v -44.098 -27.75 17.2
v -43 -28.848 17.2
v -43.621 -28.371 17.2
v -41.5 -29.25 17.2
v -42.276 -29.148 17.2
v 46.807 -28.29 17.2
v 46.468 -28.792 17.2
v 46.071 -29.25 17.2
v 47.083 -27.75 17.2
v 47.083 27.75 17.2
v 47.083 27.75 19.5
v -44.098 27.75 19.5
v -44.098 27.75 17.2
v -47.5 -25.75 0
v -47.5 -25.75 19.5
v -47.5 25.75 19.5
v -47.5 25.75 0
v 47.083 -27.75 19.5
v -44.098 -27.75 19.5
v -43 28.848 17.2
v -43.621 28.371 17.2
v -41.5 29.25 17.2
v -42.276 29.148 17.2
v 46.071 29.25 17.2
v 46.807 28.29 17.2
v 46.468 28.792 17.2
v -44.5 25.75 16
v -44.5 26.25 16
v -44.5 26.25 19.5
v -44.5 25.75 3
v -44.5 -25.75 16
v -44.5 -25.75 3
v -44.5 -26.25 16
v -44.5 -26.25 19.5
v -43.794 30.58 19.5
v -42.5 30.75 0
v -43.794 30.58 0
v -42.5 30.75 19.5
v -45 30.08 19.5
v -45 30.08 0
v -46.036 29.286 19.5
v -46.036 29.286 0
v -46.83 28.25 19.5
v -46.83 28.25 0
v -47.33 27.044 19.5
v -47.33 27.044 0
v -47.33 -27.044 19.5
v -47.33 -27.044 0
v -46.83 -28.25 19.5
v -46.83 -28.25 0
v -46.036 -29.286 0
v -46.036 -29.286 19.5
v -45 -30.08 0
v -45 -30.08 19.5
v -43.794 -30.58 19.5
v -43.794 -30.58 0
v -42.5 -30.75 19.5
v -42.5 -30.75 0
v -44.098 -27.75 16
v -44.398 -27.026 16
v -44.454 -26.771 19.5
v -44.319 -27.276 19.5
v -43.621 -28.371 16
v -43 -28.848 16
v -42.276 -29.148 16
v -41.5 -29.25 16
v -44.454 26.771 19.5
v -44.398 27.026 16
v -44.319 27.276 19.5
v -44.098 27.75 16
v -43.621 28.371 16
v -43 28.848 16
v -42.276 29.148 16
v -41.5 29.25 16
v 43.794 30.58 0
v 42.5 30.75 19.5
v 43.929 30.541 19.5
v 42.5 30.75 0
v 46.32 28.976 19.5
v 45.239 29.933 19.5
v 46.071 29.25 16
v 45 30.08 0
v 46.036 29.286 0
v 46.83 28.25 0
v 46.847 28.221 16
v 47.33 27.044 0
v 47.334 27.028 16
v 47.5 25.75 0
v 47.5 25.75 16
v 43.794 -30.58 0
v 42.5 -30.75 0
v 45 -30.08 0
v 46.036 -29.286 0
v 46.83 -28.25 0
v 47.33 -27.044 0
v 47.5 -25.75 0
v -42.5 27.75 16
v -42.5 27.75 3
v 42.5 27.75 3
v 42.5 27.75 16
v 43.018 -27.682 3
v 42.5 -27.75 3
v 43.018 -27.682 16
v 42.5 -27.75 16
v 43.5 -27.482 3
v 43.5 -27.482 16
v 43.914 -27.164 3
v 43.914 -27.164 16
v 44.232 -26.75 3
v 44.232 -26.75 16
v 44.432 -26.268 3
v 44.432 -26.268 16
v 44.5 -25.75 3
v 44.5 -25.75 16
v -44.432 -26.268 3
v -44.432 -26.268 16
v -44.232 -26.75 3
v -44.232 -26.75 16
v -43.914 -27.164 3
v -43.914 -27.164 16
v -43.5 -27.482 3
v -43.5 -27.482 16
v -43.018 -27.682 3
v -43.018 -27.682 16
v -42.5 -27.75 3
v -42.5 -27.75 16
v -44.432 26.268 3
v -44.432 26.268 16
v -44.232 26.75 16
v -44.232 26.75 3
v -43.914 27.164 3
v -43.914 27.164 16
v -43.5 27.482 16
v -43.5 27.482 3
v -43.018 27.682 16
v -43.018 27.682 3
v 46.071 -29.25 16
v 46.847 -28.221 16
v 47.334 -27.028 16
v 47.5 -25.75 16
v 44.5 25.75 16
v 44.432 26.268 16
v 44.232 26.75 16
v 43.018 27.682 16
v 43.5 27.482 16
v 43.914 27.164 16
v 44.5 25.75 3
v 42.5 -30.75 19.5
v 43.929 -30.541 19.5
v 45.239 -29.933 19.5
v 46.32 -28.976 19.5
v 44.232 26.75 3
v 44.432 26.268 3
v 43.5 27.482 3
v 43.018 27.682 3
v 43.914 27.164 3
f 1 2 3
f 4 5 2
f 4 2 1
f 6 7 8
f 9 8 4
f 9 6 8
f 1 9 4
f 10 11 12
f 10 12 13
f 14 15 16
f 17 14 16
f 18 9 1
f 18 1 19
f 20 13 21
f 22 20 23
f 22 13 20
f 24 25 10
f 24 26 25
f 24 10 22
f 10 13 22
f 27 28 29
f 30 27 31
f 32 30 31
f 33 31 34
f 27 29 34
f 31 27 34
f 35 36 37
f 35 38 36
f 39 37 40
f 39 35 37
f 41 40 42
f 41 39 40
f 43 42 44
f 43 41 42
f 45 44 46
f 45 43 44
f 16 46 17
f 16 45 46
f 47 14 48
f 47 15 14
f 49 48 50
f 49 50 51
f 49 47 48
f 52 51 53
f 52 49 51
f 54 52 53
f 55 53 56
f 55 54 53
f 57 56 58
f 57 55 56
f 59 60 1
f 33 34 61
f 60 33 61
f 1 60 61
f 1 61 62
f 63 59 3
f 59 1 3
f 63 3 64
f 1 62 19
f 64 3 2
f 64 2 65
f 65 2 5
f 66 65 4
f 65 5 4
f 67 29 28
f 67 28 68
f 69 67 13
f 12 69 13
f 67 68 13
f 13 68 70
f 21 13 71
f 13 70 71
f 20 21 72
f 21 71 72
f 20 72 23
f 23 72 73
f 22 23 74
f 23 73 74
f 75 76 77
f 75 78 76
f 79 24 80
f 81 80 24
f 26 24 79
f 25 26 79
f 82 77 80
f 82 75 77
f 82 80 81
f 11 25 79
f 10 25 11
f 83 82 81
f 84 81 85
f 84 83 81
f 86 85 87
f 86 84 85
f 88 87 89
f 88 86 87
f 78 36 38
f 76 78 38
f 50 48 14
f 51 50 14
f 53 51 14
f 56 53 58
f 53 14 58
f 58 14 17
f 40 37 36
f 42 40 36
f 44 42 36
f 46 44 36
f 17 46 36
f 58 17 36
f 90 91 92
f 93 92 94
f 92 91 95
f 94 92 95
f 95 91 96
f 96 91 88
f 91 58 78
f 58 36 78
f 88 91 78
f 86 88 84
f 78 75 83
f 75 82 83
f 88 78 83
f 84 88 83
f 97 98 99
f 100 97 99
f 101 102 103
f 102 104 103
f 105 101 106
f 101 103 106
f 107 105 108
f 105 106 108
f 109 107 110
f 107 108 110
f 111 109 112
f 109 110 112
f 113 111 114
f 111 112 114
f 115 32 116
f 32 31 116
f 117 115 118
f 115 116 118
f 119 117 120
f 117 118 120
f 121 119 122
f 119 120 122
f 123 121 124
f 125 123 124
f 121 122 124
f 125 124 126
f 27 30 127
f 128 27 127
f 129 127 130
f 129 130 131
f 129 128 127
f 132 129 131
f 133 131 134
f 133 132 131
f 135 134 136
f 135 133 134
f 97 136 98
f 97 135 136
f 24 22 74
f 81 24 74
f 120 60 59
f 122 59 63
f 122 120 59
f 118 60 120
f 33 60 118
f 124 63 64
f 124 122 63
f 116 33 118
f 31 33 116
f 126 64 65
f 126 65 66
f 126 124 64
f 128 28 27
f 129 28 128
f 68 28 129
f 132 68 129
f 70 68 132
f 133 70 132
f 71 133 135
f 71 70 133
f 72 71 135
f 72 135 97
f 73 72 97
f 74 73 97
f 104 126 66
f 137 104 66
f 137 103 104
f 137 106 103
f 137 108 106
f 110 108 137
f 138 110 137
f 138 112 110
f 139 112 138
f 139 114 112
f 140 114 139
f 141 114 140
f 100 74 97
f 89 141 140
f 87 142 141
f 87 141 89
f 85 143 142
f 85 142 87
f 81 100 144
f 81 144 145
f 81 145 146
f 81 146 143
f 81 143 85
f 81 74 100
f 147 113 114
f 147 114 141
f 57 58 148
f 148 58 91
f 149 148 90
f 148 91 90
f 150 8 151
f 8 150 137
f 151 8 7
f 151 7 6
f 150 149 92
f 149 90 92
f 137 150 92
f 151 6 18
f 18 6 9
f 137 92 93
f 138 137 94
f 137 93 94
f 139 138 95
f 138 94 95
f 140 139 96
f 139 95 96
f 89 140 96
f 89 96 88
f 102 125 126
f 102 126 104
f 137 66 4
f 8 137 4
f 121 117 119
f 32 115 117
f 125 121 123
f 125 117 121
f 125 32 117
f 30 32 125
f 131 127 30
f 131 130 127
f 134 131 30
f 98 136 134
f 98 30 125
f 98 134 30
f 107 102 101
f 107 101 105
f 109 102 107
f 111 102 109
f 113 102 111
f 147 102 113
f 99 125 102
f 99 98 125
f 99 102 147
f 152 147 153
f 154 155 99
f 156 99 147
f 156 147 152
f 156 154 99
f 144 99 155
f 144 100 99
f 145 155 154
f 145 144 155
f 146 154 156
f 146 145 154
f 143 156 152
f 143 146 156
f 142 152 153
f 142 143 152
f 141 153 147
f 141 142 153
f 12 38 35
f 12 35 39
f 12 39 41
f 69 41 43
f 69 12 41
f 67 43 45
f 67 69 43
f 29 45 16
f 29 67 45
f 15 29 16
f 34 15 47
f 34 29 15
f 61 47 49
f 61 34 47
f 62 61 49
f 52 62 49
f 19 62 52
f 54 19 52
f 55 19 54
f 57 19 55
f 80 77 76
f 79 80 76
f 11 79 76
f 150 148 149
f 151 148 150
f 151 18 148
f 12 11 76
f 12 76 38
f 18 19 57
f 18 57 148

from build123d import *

# Parameters (mm, degrees)
F0_W     = 89
F0_H     = 55.5
F1_DEPTH = 3
F0_W_2   = 95
F0_H_2   = 61.5
F2_DEPTH = 16
F4_DEPTH = 95
F5_W     = 61.5
F5_H     = 3.5
F6_DEPTH = 3
F7_R     = 5
F8_R     = 2
F9_R     = 3


with BuildPart() as f1:
    # F0 (on Top) → F1 (new body)
    with BuildSketch(Plane.XY):
        Rectangle(F0_W, F0_H)
    extrude(amount=F1_DEPTH)

    # F0 (on Top) → F2 (join)
    with BuildSketch(Plane.XY):
        Rectangle(F0_W_2, F0_H_2)
        Rectangle(F0_W, F0_H, mode=Mode.SUBTRACT)
    extrude(amount=F2_DEPTH)

    # F3 (on face) → F4 (join, through all)
    with BuildSketch(Plane.YZ.offset(47.5)):
        Polygon((29.25, 16), (30.75, 16), (30.75, 19.5), (27.75, 19.5), (27.75, 17.2), (29.25, 17.2), align=None)
        Polygon((-29.25, 17.2), (-27.75, 17.2), (-27.75, 19.5), (-30.75, 19.5), (-30.75, 16), (-29.25, 16), align=None)
    extrude(amount=-F4_DEPTH)

    # F5 (on face) → F6 (join)
    with BuildSketch(Plane(origin=(-47.5, 0, 0), x_dir=(0, -1, 0), z_dir=(-1, 0, 0))):
        with Locations((0, 17.75)):
            Rectangle(F5_W, F5_H)
    extrude(amount=-F6_DEPTH)

    # F7
    f7_edges = [f1.edges().sort_by_distance(p)[0] for p in [
        (47.5, -30.75, 9.75),
        (-47.5, -30.75, 9.75),
        (47.5, 30.75, 9.75),
        (-47.5, 30.75, 9.75),
    ]]
    fillet(f7_edges, radius=F7_R)

    # F8
    f8_edges = [f1.edges().sort_by_distance(p)[0] for p in [
        (-44.5, 27.75, 9.5),
        (-44.5, -27.75, 9.5),
        (44.5, -27.75, 9.5),
        (44.5, 27.75, 9.5),
    ]]
    fillet(f8_edges, radius=F8_R)

    # F9
    f9_edges = [f1.edges().sort_by_distance(p)[0] for p in [
        (-44.5, -29.25, 16.6),
        (-44.5, 29.25, 16.6),
    ]]
    fillet(f9_edges, radius=F9_R)


solid = f1.part
